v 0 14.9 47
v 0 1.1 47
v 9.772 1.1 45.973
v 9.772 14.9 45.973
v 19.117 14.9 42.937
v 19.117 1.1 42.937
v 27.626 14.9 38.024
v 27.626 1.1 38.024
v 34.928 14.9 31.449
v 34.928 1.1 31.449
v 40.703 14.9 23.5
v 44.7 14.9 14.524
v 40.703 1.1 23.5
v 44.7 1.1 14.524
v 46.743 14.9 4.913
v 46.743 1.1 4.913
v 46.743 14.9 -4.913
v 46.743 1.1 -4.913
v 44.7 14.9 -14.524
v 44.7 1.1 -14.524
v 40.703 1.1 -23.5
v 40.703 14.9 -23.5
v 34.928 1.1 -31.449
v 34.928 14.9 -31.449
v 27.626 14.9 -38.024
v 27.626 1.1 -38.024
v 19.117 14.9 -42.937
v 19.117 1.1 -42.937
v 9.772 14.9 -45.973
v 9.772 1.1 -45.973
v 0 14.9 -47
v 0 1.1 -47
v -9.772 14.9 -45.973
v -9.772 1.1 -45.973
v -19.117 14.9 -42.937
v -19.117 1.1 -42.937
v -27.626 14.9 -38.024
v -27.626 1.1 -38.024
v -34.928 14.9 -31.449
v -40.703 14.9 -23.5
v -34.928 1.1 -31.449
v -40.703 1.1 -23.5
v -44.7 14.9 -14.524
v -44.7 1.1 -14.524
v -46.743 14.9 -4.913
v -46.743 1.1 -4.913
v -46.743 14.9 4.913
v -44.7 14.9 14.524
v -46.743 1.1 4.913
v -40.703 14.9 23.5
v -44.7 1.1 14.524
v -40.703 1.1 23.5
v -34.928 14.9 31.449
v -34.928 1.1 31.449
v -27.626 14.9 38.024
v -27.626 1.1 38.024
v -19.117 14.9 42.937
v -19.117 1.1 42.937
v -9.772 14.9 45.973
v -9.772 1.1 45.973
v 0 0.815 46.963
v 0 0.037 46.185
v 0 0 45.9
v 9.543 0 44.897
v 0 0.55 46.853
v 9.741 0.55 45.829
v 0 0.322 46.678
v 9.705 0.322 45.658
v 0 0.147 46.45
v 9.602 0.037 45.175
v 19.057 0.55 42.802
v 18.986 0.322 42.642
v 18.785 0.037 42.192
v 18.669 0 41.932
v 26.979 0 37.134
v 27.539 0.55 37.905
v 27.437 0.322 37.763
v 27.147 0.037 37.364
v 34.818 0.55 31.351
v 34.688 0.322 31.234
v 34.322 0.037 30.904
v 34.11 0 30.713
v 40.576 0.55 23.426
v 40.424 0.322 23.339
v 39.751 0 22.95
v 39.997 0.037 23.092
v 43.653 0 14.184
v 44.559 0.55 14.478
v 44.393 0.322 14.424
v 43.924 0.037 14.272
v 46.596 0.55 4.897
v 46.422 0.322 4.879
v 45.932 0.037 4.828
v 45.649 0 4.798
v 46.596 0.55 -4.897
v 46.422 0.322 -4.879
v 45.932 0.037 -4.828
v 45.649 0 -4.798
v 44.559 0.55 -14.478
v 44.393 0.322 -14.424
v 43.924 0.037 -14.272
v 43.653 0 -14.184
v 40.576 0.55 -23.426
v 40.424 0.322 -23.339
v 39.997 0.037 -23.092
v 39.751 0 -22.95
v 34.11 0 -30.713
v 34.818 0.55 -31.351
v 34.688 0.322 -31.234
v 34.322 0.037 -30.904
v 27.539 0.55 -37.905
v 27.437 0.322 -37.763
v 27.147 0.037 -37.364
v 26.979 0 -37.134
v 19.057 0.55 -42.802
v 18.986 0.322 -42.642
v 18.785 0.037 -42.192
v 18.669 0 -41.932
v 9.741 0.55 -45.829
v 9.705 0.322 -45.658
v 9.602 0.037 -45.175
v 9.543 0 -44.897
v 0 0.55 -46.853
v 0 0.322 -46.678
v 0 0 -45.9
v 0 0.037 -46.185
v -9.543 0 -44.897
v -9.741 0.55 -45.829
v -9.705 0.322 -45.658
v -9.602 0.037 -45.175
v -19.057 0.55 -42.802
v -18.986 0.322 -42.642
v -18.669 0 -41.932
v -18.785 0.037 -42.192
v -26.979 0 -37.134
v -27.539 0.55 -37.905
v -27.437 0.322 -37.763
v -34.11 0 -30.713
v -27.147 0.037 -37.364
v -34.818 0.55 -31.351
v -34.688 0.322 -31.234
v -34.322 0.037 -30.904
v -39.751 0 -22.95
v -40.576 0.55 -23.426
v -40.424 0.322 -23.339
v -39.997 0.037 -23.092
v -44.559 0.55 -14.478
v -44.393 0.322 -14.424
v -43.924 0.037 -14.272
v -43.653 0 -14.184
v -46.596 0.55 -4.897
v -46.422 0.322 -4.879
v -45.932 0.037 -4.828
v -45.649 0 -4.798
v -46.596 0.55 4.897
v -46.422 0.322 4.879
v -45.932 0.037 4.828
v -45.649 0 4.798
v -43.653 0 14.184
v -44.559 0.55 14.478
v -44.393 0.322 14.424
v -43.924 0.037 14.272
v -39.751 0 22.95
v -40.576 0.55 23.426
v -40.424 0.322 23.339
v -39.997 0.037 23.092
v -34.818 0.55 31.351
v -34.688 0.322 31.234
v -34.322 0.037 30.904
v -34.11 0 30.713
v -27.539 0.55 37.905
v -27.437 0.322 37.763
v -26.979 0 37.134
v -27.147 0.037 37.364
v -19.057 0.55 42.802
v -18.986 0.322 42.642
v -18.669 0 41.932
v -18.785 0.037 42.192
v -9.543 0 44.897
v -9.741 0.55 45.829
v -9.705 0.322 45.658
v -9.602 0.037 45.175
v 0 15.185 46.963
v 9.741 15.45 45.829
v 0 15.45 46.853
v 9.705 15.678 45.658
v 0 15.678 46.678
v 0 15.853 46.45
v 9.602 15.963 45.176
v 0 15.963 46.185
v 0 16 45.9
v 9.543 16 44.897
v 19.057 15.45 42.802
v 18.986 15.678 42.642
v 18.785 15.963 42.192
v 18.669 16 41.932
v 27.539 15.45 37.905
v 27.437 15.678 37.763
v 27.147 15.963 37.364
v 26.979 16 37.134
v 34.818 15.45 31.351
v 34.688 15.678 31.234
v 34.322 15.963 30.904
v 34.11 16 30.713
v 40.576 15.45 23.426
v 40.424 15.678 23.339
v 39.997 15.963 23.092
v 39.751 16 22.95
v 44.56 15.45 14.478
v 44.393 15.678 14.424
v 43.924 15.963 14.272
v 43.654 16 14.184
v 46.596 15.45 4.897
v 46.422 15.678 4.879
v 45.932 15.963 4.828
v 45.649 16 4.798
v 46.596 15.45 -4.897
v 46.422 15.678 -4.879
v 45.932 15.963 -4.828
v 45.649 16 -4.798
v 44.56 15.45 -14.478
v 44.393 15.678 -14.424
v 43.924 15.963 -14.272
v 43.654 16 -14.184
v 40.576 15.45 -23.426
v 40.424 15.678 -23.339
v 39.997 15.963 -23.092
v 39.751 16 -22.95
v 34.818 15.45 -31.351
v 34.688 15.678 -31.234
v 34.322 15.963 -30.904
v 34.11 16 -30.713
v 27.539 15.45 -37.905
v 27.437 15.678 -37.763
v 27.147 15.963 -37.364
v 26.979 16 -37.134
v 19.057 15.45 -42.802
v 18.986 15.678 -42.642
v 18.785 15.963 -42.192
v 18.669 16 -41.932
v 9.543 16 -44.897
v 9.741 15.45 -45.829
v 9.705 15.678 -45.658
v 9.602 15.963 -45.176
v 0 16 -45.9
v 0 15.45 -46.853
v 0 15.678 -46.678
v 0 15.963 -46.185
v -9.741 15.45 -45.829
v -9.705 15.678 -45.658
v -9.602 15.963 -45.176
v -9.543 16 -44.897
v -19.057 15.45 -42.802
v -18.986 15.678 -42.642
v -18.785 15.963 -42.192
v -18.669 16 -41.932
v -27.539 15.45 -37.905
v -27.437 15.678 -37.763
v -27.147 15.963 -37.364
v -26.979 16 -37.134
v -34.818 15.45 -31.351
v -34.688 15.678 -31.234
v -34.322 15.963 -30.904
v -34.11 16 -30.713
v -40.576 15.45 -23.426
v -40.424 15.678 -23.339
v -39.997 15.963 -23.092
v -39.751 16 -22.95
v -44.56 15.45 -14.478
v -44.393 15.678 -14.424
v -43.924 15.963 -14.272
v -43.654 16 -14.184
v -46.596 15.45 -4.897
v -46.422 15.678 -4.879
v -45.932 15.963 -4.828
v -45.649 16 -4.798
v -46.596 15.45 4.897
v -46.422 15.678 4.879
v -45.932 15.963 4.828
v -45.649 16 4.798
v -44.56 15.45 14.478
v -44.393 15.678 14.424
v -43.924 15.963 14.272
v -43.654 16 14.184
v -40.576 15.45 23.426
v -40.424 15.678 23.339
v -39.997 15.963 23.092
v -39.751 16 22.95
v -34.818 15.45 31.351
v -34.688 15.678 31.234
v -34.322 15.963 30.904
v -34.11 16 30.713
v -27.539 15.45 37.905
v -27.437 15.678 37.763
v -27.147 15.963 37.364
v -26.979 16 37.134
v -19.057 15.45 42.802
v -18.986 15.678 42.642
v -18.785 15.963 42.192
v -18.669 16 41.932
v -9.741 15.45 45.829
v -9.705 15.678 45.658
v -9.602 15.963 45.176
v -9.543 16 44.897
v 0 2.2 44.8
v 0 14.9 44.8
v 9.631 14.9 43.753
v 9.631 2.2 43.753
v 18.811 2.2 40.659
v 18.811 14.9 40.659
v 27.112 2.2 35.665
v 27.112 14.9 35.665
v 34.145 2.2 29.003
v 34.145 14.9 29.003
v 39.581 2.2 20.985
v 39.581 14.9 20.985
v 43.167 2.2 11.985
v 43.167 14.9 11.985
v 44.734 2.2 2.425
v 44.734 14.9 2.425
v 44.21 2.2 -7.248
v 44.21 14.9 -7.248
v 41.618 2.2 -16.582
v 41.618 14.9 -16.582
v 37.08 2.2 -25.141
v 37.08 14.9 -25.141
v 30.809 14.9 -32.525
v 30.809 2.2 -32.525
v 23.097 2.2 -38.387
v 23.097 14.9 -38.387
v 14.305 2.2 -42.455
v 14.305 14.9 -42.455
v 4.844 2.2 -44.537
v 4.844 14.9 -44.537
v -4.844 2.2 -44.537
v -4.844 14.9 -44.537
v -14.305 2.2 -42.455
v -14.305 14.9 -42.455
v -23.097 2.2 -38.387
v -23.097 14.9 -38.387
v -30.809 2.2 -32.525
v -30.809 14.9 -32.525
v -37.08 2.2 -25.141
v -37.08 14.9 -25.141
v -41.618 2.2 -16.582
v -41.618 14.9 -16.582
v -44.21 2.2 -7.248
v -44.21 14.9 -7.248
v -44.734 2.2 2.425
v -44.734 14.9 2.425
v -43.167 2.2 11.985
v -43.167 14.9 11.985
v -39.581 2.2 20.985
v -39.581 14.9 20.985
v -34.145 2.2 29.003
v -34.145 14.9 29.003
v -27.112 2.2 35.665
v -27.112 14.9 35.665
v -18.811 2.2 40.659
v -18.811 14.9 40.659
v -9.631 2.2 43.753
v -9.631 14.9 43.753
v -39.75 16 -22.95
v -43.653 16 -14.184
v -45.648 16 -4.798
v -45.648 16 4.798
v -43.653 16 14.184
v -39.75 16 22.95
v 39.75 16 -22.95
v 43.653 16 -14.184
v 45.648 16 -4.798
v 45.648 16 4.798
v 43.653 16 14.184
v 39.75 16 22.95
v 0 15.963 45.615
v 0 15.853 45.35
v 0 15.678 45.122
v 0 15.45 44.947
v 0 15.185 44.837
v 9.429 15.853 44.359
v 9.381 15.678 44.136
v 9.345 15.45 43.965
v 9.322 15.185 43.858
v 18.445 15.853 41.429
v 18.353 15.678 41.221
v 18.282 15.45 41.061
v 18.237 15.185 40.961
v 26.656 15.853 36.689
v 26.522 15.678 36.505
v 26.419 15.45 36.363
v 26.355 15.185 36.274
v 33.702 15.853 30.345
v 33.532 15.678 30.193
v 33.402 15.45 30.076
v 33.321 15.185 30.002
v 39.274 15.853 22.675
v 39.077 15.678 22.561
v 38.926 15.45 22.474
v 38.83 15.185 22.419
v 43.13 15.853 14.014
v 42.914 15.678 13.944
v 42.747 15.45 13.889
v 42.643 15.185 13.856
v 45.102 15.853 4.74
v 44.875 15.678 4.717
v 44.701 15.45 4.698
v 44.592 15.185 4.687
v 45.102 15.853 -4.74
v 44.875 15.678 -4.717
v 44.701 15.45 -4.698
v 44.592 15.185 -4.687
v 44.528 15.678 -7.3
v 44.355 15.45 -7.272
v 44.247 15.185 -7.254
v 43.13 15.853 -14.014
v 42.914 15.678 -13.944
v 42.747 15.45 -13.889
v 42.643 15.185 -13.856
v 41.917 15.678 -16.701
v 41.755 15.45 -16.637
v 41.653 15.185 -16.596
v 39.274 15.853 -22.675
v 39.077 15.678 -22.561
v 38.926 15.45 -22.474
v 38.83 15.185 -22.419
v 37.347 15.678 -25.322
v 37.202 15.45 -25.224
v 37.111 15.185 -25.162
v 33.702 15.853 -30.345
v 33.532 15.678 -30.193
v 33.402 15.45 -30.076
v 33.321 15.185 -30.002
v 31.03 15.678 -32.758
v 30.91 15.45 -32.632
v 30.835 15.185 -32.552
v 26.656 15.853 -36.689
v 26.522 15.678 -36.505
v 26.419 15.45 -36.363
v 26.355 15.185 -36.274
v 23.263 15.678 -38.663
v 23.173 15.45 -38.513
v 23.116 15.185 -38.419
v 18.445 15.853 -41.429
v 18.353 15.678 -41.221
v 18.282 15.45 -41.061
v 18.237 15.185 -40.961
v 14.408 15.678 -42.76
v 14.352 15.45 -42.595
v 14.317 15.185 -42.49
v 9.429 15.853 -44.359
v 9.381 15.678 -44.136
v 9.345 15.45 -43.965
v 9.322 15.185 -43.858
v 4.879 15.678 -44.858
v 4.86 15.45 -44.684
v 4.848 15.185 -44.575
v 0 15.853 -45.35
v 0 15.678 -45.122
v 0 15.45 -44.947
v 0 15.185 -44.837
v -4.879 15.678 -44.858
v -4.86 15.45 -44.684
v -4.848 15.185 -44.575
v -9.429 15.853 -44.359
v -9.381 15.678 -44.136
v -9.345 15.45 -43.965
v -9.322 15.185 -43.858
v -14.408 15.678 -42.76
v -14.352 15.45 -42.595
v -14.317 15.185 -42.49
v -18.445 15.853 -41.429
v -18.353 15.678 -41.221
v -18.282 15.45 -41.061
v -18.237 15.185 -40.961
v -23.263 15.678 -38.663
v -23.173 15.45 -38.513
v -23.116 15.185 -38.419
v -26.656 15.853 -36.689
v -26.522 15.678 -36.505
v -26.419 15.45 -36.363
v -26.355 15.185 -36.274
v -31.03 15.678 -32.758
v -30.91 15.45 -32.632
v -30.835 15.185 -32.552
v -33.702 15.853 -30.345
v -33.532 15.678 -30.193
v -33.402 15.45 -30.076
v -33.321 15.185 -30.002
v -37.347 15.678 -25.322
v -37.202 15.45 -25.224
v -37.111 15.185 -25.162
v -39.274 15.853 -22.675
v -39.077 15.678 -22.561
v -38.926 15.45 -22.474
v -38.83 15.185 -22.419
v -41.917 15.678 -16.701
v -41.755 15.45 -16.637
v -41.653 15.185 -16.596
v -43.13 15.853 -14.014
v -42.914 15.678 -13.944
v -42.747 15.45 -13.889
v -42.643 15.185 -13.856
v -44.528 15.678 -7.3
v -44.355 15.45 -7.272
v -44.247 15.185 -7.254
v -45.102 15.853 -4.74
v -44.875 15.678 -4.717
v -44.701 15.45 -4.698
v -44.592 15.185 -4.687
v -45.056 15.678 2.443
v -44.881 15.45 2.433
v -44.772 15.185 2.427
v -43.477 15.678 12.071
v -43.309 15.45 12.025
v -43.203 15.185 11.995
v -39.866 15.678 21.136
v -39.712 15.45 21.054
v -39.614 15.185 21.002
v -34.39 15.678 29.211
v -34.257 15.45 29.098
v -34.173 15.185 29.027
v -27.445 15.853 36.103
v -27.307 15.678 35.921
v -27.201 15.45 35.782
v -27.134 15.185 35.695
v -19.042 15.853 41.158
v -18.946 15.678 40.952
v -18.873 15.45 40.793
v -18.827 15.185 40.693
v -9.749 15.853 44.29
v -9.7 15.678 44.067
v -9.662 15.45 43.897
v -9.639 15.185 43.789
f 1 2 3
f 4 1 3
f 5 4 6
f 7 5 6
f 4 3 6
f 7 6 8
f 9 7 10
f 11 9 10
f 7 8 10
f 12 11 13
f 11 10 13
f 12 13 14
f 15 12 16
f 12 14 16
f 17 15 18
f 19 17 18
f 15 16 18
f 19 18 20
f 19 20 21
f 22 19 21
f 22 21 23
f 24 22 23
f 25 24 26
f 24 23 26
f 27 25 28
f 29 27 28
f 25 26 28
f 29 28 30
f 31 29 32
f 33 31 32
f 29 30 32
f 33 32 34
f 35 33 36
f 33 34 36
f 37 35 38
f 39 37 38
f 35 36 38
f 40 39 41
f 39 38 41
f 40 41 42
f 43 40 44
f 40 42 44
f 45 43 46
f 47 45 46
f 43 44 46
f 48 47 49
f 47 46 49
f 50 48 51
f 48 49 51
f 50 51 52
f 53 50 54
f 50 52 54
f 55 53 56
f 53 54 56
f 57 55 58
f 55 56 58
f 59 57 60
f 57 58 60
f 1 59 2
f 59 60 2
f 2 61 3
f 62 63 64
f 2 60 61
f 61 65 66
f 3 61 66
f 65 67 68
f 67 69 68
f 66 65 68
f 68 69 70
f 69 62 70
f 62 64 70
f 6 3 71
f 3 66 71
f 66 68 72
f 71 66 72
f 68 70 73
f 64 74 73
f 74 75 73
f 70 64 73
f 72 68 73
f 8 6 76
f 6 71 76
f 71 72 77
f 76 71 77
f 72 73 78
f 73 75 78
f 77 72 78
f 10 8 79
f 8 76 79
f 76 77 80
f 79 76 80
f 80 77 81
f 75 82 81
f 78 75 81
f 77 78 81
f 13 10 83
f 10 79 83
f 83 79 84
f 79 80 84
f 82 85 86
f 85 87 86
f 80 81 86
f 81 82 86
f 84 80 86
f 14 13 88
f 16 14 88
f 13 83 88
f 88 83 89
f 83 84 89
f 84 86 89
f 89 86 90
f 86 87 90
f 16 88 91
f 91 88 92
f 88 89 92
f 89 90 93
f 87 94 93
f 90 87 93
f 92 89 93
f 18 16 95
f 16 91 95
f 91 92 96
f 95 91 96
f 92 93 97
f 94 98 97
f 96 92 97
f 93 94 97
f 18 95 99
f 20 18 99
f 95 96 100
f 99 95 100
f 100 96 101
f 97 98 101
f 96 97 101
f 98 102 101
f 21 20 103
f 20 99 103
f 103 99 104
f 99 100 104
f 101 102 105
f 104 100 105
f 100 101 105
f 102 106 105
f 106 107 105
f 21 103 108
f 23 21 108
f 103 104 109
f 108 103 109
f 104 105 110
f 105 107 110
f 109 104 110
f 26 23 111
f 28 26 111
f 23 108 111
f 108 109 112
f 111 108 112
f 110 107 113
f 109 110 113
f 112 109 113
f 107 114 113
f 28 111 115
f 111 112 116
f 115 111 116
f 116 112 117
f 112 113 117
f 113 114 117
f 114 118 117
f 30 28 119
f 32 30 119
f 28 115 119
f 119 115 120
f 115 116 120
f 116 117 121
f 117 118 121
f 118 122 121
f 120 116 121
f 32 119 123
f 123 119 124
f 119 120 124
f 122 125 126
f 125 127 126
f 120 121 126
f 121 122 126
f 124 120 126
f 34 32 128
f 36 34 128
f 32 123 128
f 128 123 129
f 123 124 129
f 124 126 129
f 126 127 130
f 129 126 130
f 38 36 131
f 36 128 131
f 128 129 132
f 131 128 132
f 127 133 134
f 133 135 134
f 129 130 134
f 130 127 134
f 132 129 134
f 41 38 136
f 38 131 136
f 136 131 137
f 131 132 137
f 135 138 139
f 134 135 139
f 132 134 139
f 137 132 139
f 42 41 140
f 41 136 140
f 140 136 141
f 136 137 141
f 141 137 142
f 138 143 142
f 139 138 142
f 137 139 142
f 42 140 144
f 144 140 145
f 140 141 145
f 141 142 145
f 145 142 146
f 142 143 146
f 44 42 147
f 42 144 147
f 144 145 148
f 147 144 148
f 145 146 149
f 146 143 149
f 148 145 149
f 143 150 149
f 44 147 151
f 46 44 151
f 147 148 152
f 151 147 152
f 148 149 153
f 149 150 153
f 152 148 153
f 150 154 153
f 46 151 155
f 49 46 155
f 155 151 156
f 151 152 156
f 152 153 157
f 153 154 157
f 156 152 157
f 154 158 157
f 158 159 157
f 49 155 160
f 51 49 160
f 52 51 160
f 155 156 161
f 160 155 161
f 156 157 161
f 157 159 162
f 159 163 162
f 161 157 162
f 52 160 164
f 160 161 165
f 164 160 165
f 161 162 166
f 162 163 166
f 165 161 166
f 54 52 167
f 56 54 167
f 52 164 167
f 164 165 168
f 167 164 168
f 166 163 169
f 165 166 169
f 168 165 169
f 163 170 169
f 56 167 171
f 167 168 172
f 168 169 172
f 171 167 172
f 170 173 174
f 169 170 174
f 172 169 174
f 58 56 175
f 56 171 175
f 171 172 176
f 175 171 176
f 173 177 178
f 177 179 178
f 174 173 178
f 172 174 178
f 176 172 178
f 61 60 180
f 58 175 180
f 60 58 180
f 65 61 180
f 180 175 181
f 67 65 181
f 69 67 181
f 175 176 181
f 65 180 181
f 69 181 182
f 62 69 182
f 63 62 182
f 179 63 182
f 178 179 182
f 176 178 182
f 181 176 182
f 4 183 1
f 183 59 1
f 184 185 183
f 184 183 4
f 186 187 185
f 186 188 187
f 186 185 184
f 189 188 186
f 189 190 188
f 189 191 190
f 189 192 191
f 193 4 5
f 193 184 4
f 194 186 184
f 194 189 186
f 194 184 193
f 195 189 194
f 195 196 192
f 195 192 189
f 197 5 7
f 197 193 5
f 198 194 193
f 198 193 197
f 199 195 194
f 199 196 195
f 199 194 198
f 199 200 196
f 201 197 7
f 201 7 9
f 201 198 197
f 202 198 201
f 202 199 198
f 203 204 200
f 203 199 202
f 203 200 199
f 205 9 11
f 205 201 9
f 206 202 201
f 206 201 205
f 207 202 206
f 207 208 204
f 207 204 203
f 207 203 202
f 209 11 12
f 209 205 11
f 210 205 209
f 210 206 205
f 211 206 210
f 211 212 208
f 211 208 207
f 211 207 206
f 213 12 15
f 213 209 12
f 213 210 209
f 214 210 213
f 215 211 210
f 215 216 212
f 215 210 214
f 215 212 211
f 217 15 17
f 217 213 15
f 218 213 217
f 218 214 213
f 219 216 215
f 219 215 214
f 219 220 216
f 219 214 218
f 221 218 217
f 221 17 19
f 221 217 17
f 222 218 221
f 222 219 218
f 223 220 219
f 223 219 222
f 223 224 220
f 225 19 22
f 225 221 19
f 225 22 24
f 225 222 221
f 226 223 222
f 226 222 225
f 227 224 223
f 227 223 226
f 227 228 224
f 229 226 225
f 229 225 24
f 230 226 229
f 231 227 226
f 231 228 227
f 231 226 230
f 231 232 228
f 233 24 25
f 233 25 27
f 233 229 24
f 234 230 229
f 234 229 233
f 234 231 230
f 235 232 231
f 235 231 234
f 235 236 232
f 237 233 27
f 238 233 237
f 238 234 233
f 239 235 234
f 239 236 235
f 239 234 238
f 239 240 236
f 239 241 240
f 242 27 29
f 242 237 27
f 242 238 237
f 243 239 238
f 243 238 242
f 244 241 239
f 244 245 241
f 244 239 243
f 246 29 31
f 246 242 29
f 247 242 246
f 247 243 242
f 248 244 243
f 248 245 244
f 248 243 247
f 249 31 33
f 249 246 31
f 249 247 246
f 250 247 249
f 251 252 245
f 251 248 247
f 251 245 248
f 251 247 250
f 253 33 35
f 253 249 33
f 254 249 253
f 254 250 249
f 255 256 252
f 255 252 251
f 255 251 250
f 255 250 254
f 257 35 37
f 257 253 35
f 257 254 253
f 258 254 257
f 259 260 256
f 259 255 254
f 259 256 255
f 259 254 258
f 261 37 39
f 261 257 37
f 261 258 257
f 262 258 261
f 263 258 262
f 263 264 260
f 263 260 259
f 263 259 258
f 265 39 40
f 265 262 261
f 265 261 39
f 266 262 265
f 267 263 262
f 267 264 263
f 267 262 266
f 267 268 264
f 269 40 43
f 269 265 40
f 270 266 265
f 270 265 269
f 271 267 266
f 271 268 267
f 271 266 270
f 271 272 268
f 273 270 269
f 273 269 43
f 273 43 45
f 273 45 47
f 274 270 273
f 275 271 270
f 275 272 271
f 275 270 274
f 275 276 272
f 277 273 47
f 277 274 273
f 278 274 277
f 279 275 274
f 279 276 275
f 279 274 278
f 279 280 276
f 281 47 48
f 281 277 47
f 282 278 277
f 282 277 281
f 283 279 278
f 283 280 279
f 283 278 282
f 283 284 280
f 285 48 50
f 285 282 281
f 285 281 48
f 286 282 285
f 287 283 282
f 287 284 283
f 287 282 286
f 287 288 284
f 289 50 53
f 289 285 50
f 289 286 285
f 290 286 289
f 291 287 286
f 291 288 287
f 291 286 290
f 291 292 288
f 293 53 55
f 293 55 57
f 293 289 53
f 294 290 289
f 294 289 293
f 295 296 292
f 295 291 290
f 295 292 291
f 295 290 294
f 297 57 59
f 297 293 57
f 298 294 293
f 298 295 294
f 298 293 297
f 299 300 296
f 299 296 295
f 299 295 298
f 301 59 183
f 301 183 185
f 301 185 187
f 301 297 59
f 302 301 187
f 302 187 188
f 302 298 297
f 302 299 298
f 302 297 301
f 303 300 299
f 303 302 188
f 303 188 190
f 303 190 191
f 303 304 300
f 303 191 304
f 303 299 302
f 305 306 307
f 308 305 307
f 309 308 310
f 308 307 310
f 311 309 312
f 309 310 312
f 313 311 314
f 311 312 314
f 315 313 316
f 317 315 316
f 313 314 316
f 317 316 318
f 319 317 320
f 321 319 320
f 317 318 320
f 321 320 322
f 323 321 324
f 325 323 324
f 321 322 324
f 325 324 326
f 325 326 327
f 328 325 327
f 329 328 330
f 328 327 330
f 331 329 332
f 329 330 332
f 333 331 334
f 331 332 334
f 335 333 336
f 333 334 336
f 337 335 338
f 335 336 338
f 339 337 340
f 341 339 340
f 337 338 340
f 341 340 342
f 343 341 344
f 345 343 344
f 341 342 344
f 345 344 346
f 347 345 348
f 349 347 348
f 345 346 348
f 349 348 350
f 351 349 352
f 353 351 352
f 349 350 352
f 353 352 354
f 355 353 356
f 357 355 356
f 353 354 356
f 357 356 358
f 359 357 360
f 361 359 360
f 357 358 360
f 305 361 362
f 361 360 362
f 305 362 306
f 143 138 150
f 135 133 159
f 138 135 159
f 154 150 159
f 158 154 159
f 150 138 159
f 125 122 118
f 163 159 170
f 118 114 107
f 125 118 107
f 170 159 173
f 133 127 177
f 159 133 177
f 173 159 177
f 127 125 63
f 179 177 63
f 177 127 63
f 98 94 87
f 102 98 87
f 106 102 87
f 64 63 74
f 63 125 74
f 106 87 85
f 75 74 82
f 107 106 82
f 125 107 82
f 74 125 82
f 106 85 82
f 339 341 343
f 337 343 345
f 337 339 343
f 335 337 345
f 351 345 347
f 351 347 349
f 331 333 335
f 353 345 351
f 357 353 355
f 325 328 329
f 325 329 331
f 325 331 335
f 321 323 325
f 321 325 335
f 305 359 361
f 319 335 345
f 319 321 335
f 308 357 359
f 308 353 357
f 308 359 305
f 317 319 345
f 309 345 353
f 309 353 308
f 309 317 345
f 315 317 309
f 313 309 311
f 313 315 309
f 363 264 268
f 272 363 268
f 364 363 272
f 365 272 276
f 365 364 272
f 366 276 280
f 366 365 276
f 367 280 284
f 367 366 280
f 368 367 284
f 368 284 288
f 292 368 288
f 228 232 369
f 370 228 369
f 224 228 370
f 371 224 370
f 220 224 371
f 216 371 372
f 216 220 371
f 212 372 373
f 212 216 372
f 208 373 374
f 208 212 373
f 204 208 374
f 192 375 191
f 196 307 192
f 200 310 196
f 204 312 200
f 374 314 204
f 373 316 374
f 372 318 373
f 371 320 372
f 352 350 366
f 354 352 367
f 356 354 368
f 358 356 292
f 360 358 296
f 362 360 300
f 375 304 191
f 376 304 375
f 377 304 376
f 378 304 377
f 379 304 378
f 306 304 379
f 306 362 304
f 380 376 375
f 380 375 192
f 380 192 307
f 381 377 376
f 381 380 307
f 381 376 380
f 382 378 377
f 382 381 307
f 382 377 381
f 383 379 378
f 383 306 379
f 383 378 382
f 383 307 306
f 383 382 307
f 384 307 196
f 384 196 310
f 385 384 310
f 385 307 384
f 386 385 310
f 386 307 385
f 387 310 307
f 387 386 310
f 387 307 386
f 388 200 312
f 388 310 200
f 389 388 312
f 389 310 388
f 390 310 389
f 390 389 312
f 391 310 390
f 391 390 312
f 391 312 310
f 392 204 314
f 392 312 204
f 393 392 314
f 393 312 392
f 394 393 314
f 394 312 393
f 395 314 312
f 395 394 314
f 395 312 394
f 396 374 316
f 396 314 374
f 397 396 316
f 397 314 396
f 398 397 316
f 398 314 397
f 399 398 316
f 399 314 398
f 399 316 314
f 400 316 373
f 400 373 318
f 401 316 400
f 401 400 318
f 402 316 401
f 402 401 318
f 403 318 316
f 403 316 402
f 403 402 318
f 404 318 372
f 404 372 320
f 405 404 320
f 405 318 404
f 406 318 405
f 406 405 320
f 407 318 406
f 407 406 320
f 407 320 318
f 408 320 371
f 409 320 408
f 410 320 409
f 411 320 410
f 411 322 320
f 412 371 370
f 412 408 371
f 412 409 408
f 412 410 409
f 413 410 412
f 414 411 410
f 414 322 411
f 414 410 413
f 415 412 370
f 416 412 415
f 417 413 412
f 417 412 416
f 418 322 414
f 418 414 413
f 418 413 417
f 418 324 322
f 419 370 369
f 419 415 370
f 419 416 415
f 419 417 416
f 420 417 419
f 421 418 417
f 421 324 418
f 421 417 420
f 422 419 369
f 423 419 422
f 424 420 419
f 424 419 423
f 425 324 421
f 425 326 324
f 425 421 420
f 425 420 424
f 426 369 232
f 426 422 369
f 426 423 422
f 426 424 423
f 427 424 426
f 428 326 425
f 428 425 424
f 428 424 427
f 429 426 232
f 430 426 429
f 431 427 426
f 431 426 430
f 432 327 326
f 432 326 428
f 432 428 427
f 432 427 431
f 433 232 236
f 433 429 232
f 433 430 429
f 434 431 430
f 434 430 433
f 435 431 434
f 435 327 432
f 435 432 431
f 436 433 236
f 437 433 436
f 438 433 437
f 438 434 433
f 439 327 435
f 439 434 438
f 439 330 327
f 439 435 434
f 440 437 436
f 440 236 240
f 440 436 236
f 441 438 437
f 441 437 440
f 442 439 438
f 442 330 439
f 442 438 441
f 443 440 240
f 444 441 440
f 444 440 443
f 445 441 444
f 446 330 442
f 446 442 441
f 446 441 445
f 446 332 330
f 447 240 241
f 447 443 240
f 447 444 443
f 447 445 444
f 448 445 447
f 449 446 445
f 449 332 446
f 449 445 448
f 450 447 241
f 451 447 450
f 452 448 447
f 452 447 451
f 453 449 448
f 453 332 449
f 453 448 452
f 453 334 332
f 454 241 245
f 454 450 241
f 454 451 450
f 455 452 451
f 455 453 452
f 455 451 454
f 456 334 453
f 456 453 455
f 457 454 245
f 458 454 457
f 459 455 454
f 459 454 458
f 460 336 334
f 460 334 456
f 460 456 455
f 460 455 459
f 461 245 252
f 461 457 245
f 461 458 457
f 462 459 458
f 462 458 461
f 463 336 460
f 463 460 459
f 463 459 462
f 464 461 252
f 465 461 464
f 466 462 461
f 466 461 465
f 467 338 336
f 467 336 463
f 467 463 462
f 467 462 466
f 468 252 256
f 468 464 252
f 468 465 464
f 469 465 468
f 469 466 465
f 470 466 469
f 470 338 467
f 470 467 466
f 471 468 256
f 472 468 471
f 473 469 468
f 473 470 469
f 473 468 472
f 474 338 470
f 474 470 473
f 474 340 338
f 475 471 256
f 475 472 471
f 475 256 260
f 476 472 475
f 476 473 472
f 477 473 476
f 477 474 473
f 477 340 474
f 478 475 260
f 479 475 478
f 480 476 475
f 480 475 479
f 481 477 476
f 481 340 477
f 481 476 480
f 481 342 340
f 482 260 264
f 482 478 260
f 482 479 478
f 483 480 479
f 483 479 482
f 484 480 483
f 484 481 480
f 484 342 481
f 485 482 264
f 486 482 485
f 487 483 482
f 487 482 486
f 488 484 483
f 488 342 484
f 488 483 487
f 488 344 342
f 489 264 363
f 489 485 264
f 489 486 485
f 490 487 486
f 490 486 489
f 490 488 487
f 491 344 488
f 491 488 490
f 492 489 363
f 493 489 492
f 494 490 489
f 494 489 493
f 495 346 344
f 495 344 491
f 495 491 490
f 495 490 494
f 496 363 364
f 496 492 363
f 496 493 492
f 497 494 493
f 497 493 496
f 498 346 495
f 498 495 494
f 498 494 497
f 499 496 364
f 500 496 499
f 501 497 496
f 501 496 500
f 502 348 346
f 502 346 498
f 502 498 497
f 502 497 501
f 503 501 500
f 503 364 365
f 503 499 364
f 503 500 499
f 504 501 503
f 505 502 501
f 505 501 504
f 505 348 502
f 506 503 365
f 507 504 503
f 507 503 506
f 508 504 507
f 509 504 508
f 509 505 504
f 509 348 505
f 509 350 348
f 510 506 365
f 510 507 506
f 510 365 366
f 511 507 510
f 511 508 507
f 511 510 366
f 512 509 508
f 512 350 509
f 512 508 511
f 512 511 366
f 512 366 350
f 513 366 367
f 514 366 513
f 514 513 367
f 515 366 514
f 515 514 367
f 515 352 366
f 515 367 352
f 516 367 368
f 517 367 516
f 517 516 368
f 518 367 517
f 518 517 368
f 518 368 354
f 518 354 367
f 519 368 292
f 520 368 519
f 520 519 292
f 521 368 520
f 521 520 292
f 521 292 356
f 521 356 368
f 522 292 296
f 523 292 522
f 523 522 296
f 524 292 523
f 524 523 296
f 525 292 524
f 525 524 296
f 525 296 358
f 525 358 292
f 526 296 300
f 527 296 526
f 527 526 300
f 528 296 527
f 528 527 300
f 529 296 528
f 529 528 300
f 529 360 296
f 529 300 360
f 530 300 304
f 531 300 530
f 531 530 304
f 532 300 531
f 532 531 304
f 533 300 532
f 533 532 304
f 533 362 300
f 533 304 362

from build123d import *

# Parameters (mm, degrees)
SKETCH1_R           = 47
BOSS_EXTRUDE1_DEPTH = 16
SKETCH2_R           = 44.8
CUT_EXTRUDE1_DEPTH  = 13.8
FILLET1_R           = 1.1
FILLET2_R           = 1.1


with BuildPart() as part:
    # Sketch1 → Boss-Extrude1 (new body)
    with BuildSketch(Plane(origin=(0, 0, 0), x_dir=(1, 0, 0), z_dir=(0, 1, 0))):
        with Locations(Location((0, 0, 0), (0, 0, 270))):
            Circle(SKETCH1_R)
    extrude(amount=BOSS_EXTRUDE1_DEPTH)

    # Sketch2 → Cut-Extrude1 (cut)
    with BuildSketch(Plane(origin=(0, 16, 0), x_dir=(1, 0, 0), z_dir=(0, 1, 0))):
        with Locations(Location((0, 0, 0), (0, 0, 270))):
            Circle(SKETCH2_R)
    extrude(amount=-CUT_EXTRUDE1_DEPTH, mode=Mode.SUBTRACT)

    # Fillet1
    fillet1_edges = [part.edges().sort_by_distance(p)[0] for p in [
        (0, 16, -47),
        (0, 16, -44.8),
    ]]
    fillet(fillet1_edges, radius=FILLET1_R - 0.0001)  # a hair under: the kernel refuses the full size

    # Fillet2
    fillet2_edges = [part.edges().sort_by_distance(p)[0] for p in [
        (0, 0, -47),
    ]]
    fillet(fillet2_edges, radius=FILLET2_R)


solid = part.part
